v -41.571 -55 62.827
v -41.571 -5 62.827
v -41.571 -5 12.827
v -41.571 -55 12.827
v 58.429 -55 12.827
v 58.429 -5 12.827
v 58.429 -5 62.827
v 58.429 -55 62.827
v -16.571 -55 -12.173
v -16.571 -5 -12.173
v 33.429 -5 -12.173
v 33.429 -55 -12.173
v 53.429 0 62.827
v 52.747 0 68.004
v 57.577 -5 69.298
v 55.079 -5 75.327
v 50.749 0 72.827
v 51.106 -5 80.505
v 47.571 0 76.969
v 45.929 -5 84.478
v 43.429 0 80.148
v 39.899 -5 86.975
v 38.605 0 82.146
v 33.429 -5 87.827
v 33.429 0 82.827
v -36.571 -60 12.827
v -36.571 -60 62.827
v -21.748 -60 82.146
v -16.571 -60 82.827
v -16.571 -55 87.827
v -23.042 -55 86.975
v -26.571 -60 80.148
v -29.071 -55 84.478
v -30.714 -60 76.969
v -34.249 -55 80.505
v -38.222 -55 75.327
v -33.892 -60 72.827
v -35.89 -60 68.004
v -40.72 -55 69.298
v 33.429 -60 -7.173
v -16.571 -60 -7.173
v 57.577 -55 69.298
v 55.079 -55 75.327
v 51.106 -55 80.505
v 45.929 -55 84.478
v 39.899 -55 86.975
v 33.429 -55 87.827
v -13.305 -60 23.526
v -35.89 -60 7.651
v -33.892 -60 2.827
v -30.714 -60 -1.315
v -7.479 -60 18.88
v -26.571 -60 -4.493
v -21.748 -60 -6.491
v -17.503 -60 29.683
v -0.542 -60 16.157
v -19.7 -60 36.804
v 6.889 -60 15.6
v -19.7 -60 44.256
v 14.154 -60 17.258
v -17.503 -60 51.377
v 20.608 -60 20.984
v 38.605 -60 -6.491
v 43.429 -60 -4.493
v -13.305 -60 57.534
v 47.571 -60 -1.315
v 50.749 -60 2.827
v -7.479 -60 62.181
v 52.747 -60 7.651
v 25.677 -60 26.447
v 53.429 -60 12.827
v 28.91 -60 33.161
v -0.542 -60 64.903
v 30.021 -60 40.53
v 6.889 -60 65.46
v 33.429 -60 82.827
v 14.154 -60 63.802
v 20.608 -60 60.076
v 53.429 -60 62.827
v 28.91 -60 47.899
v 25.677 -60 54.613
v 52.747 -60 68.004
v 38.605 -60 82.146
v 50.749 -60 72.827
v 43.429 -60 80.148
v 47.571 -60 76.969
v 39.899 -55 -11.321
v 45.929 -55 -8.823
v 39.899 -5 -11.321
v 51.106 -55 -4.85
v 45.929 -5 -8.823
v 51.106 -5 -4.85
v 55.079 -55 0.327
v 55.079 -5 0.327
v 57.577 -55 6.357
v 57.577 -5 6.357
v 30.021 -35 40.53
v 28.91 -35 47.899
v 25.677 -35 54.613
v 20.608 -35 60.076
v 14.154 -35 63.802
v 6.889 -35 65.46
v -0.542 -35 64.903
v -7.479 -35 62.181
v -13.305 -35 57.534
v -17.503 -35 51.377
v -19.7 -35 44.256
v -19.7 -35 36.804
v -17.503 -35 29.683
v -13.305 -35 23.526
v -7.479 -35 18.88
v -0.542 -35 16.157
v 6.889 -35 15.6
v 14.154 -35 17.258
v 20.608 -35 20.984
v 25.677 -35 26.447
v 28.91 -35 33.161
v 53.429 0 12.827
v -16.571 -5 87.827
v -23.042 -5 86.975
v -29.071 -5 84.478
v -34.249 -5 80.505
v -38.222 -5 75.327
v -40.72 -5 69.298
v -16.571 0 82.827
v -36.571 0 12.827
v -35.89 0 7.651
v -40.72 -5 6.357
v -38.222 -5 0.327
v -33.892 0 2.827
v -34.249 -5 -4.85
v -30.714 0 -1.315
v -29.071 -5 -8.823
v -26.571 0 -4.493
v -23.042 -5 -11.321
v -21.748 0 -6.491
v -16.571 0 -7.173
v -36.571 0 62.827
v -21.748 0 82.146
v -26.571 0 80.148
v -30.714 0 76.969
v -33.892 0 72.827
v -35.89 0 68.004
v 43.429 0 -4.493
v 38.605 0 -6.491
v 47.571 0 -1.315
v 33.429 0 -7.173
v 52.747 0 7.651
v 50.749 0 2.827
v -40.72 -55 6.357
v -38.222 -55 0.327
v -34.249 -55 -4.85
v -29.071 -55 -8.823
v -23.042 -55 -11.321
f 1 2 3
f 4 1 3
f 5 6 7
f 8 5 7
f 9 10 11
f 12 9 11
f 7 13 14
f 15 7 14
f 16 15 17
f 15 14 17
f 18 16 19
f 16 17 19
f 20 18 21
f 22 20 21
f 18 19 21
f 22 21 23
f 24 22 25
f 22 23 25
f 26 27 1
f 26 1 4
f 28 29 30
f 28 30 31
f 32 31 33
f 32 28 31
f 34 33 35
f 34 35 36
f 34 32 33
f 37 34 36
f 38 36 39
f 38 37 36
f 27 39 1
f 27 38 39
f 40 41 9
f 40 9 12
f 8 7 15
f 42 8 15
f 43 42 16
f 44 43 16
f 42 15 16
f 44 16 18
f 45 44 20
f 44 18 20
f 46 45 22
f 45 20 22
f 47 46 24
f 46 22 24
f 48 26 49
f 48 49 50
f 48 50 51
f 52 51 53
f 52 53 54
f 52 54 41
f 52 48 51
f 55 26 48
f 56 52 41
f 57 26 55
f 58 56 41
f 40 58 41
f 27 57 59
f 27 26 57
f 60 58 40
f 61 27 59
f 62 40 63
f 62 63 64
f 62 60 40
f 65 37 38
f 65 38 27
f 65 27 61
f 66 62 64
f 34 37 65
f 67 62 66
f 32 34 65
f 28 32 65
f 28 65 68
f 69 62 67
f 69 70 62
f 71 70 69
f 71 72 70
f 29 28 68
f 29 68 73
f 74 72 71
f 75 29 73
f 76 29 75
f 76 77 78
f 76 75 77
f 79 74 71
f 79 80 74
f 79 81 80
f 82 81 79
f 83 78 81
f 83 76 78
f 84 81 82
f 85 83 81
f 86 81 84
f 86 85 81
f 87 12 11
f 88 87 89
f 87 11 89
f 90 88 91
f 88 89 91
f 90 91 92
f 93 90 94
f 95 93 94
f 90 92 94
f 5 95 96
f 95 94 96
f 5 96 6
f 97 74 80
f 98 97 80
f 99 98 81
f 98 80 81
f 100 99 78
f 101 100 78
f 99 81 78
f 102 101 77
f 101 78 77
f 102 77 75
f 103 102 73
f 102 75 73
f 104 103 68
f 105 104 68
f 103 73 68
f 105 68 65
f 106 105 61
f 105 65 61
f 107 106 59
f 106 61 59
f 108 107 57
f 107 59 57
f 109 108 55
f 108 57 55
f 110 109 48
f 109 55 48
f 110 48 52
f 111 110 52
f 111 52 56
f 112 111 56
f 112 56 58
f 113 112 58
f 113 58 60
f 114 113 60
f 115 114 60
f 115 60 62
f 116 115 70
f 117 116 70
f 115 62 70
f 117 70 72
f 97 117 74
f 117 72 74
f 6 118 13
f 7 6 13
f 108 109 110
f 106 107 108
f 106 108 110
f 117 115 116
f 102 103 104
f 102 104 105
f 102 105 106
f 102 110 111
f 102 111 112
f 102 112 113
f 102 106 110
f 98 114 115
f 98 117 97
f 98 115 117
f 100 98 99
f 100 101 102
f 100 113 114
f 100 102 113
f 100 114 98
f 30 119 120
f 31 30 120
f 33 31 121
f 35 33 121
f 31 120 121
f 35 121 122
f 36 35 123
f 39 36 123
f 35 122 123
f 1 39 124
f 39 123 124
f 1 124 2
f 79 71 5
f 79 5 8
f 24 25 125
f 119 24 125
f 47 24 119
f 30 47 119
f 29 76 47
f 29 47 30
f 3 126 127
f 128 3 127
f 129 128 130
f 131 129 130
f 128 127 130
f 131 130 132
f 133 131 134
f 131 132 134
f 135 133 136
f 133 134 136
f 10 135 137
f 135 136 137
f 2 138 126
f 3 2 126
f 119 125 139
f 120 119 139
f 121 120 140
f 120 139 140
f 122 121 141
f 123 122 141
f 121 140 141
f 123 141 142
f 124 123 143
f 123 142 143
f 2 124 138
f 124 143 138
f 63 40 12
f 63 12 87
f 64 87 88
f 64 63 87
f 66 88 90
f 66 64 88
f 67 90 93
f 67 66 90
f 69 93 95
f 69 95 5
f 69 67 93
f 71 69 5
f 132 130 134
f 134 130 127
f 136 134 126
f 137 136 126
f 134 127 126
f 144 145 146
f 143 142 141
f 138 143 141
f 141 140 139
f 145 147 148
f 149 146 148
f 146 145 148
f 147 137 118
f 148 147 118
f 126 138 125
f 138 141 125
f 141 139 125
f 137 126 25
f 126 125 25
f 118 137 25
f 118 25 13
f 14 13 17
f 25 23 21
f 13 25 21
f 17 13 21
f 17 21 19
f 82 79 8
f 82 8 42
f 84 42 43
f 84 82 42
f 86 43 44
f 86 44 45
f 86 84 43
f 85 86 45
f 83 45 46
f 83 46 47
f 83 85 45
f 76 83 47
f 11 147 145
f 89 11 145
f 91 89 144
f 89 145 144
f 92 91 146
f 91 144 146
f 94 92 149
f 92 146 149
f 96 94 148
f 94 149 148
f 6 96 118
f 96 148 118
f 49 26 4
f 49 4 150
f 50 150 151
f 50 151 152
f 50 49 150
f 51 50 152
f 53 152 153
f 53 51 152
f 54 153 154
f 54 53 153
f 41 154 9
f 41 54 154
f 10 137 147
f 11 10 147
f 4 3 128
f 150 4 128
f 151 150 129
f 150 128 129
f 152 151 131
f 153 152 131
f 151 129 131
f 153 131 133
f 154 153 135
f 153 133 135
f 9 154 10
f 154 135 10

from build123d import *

# Parameters (mm, degrees)
F1_DEPTH = 60
F2_SIZE  = 5
F3_R     = 25
F4_DEPTH = 25


with BuildPart() as f1:
    # F0 (on Front) → F1 (new body)
    with BuildSketch(Plane.XZ):
        with BuildLine():
            Line((33.428539, 87.827305), (-16.571461, 87.827305))
            ThreePointArc((-16.571461, 87.827305), (-34.24913, 80.504975), (-41.571461, 62.827305))
            Line((-41.571461, 62.827305), (-41.571461, 12.827305))
            ThreePointArc((-41.571461, 12.827305), (-34.24913, -4.850364), (-16.571461, -12.172695))
            Line((-16.571461, -12.172695), (33.428539, -12.172695))
            ThreePointArc((33.428539, -12.172695), (51.106209, -4.850364), (58.428539, 12.827305))
            Line((58.428539, 12.827305), (58.428539, 62.827305))
            ThreePointArc((58.428539, 62.827305), (51.106209, 80.504975), (33.428539, 87.827305))
        make_face()
    extrude(amount=F1_DEPTH)

    # F2
    f2_edges = [f1.edges().sort_by_distance(p)[0] for p in [
        (58.428539, -60, 37.827305),
        (51.106209, -60, 80.504975),
        (8.428539, -60, 87.827305),
        (-34.24913, -60, 80.504975),
        (-41.571461, -60, 37.827305),
        (-34.24913, -60, -4.850364),
        (8.428539, -60, -12.172695),
        (51.106209, -60, -4.850364),
        (58.428539, 0, 37.827305),
        (51.106209, 0, 80.504975),
        (8.428539, 0, 87.827305),
        (-34.24913, 0, 80.504975),
        (-41.571461, 0, 37.827305),
        (-34.24913, 0, -4.850364),
        (8.428539, 0, -12.172695),
        (51.106209, 0, -4.850364),
    ]]
    chamfer(f2_edges, length=F2_SIZE)

    # F3 (on face) → F4 (cut)
    with BuildSketch(Plane.XZ.offset(60)):
        with Locations((5.020919, 40.530141)):
            Circle(F3_R)
    extrude(amount=-F4_DEPTH, mode=Mode.SUBTRACT)


solid = f1.part
